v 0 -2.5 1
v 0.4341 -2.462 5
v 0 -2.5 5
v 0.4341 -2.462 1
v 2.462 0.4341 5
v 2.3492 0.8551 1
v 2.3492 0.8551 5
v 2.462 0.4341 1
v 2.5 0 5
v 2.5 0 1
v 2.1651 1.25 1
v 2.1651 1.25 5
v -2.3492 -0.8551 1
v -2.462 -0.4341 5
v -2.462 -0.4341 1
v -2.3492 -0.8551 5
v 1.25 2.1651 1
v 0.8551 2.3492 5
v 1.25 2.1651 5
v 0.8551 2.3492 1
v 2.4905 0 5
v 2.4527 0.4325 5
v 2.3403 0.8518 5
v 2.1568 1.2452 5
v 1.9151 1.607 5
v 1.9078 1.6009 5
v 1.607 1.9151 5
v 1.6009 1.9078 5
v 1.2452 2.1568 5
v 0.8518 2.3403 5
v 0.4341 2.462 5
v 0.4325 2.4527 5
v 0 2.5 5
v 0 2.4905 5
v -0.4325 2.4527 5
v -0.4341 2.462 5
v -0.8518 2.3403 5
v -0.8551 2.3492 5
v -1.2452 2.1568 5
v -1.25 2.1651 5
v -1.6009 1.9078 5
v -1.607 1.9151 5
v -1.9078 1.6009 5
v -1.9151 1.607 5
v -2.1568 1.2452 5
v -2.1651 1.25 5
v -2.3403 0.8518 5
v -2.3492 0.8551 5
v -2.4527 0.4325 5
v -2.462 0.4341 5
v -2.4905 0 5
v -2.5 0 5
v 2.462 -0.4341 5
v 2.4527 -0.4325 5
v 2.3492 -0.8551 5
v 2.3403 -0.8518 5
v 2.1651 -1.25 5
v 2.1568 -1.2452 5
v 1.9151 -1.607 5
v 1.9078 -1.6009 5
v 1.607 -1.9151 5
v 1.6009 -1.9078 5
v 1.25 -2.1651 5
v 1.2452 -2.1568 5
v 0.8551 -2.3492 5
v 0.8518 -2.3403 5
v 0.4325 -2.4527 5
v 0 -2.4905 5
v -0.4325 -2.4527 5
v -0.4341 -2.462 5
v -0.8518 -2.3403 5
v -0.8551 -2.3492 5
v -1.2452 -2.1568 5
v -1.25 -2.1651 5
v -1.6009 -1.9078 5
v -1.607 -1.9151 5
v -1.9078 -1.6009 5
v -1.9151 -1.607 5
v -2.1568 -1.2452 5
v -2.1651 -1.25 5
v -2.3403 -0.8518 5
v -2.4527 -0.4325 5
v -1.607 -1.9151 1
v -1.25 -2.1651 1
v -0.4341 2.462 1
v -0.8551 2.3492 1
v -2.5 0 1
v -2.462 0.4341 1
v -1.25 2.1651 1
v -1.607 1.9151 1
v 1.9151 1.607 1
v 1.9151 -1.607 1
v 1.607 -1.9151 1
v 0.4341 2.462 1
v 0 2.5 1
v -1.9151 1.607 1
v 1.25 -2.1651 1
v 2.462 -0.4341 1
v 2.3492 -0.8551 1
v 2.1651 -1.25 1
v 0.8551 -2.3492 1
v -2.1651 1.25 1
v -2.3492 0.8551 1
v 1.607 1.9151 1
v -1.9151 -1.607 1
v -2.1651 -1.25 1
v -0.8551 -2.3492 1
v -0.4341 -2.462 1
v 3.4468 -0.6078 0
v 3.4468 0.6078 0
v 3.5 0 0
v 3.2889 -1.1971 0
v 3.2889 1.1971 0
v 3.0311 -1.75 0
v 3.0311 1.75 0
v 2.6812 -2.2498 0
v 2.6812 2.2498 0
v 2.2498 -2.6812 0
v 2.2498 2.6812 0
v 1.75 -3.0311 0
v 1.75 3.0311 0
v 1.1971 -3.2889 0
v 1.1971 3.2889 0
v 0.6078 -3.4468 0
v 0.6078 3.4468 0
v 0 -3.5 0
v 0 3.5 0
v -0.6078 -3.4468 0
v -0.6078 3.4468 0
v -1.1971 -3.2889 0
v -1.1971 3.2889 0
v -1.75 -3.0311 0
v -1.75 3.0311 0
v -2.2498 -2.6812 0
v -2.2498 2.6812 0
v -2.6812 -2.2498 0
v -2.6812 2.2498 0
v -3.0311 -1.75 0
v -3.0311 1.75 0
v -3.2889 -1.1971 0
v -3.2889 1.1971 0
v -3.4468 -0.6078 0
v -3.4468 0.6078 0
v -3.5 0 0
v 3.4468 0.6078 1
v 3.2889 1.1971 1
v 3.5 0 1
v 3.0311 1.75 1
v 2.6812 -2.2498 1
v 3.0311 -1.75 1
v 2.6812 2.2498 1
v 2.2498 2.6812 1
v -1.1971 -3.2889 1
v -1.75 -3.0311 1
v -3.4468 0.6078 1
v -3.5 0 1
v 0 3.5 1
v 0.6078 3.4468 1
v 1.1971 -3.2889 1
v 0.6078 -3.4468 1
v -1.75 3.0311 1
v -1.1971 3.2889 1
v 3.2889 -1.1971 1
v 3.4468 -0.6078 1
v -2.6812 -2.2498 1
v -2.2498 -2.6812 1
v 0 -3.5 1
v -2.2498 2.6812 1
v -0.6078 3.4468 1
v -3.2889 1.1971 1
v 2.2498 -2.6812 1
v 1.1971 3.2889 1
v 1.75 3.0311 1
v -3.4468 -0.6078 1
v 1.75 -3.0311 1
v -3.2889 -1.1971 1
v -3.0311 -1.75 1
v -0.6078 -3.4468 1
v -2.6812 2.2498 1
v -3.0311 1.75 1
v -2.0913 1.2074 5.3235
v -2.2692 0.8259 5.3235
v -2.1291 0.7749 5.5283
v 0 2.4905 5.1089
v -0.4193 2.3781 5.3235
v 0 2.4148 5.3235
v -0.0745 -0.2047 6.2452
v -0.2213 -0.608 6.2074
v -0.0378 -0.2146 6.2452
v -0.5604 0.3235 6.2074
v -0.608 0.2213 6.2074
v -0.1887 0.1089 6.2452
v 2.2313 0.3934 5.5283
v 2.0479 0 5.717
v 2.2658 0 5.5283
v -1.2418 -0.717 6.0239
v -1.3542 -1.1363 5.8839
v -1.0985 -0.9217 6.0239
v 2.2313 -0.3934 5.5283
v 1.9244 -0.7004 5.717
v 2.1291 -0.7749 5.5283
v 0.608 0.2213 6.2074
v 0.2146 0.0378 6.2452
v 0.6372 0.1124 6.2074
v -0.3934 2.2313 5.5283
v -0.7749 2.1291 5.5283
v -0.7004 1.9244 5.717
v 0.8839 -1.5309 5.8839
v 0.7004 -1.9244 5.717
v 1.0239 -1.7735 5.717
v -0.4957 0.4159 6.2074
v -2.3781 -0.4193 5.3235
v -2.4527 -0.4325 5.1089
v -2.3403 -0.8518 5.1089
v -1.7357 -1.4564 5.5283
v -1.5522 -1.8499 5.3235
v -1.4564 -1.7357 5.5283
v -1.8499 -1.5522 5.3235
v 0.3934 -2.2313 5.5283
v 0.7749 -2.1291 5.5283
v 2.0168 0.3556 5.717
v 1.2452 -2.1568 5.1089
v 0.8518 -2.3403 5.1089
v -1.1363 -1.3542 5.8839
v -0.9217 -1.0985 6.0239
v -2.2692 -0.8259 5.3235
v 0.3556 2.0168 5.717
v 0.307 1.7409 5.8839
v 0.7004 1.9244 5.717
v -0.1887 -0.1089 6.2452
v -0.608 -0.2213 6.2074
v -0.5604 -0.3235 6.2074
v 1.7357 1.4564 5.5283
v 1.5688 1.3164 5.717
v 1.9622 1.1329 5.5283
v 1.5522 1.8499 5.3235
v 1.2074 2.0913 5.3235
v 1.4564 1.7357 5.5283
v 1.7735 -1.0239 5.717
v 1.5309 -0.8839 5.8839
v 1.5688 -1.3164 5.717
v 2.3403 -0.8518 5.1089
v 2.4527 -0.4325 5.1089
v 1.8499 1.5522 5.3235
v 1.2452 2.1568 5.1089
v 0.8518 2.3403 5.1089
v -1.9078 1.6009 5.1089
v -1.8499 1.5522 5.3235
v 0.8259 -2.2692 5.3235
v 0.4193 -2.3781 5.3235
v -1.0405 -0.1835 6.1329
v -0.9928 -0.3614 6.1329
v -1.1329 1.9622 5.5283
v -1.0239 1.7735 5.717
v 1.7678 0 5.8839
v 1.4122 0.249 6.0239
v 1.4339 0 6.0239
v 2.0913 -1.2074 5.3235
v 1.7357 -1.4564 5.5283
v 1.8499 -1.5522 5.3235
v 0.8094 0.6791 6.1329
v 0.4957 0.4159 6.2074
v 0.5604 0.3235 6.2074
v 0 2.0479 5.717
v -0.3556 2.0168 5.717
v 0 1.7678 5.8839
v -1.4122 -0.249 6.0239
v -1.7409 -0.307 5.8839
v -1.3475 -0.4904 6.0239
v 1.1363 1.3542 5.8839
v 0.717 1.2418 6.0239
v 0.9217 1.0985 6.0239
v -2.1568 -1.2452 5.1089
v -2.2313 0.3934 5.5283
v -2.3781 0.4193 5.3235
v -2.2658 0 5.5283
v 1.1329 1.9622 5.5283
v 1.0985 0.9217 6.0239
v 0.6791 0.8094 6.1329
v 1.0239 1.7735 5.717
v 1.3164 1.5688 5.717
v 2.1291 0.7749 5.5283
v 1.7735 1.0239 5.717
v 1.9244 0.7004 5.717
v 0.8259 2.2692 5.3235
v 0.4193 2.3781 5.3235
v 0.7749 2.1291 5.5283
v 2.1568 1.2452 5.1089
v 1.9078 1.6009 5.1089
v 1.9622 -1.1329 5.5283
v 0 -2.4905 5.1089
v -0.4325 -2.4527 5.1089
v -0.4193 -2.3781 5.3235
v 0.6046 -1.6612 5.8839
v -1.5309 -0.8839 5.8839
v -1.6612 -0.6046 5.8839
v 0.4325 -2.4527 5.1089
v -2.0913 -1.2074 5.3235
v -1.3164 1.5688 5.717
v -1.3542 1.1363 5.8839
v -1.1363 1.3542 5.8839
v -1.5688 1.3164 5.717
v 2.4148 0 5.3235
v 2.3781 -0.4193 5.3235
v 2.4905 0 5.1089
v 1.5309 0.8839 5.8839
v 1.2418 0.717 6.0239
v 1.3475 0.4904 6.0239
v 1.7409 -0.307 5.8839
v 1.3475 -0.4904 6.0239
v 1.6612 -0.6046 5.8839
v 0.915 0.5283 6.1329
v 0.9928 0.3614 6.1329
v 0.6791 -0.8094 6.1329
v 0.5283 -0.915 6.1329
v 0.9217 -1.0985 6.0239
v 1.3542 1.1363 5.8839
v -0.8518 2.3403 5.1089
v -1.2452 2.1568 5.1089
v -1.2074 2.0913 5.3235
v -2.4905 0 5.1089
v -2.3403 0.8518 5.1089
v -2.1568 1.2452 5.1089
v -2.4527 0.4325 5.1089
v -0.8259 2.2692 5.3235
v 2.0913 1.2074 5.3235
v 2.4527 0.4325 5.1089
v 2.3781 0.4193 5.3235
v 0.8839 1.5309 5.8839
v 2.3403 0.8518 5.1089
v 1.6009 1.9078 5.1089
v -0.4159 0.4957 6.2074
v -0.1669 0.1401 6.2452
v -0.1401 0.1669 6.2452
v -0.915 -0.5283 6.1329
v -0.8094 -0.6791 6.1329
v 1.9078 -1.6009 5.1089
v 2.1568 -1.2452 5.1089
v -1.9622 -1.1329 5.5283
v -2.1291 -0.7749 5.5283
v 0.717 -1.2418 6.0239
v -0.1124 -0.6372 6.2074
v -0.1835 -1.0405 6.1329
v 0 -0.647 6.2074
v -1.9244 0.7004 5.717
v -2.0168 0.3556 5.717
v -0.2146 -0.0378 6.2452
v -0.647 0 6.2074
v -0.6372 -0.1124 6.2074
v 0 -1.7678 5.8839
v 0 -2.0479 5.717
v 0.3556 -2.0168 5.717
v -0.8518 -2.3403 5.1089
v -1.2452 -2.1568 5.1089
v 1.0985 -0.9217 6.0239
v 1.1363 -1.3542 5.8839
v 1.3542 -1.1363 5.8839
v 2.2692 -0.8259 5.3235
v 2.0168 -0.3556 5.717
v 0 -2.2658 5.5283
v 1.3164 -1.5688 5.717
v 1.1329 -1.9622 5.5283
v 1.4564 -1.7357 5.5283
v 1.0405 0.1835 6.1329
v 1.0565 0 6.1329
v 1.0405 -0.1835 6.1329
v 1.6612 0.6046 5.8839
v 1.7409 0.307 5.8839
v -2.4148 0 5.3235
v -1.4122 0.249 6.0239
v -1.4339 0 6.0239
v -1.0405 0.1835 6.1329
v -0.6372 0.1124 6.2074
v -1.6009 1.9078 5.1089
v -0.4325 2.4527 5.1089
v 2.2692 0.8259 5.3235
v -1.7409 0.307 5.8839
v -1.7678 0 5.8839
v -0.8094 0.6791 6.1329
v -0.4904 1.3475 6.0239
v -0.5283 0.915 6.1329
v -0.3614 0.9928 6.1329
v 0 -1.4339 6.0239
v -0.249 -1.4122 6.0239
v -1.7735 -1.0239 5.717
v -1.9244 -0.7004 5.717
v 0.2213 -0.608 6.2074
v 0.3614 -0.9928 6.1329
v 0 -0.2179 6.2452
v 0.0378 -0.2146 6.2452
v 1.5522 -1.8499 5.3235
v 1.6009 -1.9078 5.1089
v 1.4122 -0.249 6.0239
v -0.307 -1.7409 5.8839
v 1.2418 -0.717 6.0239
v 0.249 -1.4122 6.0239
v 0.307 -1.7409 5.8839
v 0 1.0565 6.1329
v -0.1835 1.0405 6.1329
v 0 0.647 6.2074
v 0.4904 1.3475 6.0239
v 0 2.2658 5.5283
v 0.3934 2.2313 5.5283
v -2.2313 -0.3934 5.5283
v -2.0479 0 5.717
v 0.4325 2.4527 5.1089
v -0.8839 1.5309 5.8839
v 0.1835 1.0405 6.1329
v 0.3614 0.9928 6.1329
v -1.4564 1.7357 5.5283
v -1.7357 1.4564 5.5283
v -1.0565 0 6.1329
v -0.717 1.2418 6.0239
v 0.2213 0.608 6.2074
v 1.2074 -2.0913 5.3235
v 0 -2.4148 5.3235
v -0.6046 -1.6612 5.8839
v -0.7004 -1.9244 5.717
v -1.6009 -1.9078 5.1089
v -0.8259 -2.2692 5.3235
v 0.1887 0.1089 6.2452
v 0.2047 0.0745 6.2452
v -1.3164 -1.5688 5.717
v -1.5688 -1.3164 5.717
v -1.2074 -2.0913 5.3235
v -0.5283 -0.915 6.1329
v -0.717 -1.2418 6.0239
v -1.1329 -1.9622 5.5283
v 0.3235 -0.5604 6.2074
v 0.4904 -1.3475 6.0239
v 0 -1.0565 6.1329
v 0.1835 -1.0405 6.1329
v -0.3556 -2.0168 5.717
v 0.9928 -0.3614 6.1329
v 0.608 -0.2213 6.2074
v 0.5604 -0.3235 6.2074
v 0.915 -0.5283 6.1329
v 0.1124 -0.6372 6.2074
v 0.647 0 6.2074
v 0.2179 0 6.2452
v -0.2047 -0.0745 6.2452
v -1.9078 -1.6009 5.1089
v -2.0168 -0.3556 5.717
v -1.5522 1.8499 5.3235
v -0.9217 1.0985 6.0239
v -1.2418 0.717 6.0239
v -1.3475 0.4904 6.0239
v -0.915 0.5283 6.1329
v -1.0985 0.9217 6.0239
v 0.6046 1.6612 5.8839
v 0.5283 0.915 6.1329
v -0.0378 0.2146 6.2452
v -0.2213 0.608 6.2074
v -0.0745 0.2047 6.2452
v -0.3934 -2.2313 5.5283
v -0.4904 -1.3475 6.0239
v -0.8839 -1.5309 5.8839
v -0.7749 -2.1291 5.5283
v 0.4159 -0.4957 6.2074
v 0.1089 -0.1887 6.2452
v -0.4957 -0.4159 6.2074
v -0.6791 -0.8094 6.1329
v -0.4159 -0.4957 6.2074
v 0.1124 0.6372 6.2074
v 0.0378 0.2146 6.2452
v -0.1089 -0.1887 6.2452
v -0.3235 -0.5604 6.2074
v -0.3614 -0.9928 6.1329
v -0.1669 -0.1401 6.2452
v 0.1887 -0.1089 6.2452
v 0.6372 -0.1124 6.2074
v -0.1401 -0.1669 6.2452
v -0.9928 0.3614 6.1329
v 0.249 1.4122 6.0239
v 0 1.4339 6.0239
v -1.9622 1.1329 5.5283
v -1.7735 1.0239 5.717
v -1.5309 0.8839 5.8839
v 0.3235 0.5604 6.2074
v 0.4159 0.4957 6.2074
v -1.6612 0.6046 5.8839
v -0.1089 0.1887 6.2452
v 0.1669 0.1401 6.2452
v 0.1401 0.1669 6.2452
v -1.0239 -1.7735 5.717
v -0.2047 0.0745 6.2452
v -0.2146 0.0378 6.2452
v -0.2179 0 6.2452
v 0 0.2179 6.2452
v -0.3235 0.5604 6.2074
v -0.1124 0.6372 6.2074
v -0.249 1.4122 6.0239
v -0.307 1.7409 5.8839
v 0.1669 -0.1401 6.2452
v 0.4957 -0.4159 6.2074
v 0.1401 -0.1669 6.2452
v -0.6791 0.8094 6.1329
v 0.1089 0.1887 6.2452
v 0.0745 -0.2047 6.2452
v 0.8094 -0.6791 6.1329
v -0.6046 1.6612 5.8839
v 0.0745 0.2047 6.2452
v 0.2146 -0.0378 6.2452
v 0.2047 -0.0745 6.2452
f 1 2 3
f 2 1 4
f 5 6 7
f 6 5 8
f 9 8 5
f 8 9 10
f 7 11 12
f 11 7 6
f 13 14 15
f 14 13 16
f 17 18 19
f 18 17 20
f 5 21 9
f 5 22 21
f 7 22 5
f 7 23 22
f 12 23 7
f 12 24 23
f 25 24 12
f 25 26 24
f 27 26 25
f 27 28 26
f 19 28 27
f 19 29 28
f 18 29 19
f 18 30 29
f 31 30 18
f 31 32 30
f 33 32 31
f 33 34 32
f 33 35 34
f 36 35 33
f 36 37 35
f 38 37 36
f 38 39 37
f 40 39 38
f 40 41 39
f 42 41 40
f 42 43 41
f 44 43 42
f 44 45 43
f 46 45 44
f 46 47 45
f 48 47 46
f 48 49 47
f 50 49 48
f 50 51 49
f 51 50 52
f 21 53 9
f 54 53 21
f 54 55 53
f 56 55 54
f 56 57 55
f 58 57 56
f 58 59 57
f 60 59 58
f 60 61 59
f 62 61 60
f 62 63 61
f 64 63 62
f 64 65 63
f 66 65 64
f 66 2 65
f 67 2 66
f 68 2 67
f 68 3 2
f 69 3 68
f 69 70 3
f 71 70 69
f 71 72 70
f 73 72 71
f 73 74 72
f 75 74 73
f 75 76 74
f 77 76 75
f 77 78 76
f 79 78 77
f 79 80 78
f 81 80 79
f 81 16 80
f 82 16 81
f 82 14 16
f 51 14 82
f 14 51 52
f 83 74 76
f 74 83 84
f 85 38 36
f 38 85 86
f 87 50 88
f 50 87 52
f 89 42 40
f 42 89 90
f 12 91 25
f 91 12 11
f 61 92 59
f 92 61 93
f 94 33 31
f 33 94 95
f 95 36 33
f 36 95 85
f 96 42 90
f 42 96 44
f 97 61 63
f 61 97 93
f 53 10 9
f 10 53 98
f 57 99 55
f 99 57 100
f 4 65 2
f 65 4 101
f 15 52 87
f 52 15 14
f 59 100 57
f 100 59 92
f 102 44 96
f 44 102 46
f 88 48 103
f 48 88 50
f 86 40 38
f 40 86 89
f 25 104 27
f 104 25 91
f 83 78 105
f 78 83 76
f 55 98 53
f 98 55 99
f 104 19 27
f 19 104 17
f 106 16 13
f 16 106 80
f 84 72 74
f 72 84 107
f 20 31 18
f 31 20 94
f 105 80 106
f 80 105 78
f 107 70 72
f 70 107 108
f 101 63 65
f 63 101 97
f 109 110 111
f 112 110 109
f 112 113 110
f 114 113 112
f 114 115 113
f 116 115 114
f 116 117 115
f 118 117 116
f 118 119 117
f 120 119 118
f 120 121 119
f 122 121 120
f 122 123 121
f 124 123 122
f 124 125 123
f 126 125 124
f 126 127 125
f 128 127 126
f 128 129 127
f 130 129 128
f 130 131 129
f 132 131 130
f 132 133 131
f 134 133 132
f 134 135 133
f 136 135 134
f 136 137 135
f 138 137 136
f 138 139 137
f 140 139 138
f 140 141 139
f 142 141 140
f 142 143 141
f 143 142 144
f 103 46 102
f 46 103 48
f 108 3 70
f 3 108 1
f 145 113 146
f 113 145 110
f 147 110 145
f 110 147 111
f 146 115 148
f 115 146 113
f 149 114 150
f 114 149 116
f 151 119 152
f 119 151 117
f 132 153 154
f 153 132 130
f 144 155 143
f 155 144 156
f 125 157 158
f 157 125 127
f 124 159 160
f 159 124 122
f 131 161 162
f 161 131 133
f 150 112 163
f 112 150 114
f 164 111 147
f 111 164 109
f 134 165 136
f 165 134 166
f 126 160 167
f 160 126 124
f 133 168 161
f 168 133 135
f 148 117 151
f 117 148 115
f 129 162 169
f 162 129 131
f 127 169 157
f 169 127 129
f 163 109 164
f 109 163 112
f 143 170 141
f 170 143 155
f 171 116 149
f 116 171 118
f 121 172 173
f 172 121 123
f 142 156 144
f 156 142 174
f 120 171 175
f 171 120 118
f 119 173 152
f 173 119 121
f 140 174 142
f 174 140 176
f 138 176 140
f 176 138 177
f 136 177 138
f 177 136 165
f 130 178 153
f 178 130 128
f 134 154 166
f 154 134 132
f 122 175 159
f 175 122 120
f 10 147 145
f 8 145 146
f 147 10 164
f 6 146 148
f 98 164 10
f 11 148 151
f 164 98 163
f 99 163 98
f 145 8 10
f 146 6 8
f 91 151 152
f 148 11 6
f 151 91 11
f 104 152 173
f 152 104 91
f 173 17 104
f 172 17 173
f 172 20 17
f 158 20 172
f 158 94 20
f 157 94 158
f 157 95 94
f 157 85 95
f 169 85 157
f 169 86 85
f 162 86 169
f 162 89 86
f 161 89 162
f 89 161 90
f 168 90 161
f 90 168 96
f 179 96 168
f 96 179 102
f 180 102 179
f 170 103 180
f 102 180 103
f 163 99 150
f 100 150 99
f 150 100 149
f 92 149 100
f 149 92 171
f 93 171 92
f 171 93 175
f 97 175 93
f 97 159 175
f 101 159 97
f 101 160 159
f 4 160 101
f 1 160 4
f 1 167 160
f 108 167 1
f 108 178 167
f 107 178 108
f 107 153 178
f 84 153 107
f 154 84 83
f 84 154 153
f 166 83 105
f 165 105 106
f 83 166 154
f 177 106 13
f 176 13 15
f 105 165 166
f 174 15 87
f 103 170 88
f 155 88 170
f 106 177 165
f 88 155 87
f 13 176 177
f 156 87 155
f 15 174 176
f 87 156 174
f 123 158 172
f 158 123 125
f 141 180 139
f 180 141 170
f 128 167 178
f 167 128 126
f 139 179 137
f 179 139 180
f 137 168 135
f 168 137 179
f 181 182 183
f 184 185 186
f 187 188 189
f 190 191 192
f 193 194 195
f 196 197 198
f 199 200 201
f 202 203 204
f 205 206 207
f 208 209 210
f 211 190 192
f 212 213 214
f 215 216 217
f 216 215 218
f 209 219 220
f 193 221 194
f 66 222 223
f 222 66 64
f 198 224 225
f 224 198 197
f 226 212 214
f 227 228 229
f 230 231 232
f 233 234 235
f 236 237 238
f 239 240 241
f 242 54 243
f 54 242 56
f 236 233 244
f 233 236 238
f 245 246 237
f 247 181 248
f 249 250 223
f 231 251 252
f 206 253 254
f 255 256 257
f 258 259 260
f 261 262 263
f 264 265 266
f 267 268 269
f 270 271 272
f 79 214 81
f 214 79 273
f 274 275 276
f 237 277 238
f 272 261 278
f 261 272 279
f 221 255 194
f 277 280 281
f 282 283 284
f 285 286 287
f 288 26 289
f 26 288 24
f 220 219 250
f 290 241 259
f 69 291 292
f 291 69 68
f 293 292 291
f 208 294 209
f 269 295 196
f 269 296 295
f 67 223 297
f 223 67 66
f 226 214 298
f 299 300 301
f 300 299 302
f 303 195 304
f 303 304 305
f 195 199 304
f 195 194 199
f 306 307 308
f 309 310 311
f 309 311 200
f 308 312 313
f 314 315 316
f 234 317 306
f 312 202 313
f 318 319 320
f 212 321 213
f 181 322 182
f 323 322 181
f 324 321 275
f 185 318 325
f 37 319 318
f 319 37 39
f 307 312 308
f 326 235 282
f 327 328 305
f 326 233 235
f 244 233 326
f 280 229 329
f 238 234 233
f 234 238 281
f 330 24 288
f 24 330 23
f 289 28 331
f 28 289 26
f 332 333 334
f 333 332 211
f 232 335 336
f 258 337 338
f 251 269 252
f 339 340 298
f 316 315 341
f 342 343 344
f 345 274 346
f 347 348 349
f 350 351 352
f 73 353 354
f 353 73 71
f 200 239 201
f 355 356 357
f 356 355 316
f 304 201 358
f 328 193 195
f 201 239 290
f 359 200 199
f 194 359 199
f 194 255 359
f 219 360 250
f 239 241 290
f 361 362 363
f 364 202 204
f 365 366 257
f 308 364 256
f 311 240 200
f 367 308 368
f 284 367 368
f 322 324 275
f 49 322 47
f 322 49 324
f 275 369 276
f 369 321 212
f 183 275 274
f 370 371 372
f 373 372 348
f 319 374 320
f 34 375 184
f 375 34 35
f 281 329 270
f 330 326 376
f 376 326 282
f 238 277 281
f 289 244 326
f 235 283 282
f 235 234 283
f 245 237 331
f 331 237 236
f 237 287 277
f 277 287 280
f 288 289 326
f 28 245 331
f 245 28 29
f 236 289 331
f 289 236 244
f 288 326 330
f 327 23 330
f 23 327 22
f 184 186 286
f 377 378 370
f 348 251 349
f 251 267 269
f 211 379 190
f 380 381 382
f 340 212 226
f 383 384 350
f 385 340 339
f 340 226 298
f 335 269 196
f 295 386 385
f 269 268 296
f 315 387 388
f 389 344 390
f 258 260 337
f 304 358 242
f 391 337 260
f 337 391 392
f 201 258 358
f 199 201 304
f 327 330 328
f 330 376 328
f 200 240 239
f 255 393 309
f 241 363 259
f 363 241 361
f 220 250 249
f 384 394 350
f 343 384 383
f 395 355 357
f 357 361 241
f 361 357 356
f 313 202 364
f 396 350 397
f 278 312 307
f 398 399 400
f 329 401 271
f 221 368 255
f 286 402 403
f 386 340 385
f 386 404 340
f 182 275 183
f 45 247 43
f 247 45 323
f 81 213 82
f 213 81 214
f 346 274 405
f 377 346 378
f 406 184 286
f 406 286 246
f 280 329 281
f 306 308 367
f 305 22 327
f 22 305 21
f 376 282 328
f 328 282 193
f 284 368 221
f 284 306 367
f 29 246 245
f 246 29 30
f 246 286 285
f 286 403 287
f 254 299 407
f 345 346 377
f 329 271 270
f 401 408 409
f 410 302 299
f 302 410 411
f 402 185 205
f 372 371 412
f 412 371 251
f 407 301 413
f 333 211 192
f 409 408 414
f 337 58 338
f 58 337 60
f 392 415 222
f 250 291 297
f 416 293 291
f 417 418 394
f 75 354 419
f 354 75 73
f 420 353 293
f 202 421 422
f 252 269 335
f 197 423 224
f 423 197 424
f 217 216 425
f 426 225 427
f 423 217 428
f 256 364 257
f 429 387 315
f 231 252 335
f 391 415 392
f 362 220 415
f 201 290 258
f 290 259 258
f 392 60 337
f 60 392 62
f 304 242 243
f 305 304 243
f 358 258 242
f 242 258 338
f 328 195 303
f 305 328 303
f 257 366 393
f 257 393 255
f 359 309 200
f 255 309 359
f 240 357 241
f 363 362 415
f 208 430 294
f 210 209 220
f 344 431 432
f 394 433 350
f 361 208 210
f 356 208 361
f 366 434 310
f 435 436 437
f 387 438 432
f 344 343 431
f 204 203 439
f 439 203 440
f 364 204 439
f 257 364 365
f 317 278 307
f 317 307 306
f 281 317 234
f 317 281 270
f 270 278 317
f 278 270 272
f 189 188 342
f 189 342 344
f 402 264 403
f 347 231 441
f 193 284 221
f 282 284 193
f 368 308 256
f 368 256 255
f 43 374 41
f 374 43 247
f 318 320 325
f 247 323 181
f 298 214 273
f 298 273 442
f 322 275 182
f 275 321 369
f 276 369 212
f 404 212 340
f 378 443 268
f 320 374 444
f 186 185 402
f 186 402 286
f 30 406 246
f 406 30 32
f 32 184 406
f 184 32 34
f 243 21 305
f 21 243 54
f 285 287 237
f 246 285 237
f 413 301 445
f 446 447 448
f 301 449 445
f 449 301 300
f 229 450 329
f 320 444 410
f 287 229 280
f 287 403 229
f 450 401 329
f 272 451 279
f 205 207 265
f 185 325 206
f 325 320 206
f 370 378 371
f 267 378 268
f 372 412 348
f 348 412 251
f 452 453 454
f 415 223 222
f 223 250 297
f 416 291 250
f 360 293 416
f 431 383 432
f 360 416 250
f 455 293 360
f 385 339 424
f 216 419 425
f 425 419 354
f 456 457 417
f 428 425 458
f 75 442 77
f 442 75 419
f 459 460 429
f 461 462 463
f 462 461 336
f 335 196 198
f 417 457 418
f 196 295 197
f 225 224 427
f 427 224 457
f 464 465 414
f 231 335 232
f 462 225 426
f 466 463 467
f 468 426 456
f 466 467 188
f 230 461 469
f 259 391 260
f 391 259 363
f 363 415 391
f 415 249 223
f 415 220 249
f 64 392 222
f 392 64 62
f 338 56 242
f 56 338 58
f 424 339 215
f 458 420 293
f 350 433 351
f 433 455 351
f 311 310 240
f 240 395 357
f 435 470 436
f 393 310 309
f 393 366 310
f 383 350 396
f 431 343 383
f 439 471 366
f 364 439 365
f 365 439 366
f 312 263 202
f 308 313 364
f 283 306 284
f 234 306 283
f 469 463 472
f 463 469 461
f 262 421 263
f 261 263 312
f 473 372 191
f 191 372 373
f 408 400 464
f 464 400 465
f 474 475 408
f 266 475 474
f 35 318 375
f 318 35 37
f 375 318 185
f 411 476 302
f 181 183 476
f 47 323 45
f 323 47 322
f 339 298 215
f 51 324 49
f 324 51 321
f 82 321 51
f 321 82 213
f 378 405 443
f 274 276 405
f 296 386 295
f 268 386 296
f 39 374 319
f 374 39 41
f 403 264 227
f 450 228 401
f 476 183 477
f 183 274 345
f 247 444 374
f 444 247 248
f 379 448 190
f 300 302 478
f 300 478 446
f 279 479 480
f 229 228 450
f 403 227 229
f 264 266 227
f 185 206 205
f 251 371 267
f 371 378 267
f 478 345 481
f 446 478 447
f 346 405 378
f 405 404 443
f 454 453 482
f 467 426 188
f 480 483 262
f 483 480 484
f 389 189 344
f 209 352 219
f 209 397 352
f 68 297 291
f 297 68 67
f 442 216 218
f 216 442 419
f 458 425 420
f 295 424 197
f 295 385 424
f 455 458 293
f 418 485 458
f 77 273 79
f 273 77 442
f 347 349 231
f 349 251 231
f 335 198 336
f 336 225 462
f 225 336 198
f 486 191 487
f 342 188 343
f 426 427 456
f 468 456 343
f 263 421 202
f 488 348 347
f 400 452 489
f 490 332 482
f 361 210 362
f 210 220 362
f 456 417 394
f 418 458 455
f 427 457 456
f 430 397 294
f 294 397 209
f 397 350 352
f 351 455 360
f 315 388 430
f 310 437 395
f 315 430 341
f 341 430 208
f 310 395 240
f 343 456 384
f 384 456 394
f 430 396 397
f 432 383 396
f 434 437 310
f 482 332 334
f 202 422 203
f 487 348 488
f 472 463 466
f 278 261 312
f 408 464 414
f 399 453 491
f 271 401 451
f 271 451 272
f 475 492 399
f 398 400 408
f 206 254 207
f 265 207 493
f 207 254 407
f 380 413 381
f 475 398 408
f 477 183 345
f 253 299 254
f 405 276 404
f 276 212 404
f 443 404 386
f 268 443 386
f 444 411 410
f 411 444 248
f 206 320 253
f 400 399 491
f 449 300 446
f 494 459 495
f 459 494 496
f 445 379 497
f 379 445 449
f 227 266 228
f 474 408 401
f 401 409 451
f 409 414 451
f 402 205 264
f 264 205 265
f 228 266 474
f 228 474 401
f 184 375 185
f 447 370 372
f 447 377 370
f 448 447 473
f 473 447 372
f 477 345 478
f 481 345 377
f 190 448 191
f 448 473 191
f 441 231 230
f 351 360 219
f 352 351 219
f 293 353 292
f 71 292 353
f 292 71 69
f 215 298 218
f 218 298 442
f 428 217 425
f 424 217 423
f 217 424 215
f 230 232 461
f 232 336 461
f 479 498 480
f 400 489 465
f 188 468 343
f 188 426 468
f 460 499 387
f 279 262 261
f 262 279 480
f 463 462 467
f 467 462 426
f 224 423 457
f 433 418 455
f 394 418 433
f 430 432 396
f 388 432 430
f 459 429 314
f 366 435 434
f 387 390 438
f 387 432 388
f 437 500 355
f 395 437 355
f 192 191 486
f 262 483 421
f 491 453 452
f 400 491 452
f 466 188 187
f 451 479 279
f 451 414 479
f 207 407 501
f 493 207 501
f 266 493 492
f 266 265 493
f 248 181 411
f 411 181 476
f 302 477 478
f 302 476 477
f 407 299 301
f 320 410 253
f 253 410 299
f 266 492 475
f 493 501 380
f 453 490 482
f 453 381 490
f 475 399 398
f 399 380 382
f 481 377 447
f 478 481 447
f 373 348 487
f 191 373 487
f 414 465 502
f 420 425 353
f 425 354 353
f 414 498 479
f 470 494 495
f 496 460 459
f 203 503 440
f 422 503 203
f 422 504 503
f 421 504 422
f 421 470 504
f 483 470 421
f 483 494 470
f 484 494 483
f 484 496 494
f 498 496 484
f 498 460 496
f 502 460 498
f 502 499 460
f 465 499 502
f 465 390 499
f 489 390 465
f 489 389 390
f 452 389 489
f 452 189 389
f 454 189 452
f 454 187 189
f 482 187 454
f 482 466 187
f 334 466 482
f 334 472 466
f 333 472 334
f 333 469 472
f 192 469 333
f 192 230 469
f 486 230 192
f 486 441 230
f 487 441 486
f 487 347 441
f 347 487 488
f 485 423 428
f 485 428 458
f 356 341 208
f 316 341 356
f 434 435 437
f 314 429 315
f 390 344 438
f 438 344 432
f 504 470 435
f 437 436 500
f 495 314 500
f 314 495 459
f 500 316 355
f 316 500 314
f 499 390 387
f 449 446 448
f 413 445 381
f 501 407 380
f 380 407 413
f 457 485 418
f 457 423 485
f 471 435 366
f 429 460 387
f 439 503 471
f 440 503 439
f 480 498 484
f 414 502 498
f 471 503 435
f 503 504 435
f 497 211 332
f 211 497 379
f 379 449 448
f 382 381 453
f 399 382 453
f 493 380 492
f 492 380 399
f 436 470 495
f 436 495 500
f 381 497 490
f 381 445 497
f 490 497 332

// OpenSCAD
$fn=36;

union(){
 cylinder(h=5, d=5, center=false);
 cylinder(h=1, d=7, center=false);
 translate([0,0,5])
    scale([1,1,0.5]) 
     sphere(d=5);
}
